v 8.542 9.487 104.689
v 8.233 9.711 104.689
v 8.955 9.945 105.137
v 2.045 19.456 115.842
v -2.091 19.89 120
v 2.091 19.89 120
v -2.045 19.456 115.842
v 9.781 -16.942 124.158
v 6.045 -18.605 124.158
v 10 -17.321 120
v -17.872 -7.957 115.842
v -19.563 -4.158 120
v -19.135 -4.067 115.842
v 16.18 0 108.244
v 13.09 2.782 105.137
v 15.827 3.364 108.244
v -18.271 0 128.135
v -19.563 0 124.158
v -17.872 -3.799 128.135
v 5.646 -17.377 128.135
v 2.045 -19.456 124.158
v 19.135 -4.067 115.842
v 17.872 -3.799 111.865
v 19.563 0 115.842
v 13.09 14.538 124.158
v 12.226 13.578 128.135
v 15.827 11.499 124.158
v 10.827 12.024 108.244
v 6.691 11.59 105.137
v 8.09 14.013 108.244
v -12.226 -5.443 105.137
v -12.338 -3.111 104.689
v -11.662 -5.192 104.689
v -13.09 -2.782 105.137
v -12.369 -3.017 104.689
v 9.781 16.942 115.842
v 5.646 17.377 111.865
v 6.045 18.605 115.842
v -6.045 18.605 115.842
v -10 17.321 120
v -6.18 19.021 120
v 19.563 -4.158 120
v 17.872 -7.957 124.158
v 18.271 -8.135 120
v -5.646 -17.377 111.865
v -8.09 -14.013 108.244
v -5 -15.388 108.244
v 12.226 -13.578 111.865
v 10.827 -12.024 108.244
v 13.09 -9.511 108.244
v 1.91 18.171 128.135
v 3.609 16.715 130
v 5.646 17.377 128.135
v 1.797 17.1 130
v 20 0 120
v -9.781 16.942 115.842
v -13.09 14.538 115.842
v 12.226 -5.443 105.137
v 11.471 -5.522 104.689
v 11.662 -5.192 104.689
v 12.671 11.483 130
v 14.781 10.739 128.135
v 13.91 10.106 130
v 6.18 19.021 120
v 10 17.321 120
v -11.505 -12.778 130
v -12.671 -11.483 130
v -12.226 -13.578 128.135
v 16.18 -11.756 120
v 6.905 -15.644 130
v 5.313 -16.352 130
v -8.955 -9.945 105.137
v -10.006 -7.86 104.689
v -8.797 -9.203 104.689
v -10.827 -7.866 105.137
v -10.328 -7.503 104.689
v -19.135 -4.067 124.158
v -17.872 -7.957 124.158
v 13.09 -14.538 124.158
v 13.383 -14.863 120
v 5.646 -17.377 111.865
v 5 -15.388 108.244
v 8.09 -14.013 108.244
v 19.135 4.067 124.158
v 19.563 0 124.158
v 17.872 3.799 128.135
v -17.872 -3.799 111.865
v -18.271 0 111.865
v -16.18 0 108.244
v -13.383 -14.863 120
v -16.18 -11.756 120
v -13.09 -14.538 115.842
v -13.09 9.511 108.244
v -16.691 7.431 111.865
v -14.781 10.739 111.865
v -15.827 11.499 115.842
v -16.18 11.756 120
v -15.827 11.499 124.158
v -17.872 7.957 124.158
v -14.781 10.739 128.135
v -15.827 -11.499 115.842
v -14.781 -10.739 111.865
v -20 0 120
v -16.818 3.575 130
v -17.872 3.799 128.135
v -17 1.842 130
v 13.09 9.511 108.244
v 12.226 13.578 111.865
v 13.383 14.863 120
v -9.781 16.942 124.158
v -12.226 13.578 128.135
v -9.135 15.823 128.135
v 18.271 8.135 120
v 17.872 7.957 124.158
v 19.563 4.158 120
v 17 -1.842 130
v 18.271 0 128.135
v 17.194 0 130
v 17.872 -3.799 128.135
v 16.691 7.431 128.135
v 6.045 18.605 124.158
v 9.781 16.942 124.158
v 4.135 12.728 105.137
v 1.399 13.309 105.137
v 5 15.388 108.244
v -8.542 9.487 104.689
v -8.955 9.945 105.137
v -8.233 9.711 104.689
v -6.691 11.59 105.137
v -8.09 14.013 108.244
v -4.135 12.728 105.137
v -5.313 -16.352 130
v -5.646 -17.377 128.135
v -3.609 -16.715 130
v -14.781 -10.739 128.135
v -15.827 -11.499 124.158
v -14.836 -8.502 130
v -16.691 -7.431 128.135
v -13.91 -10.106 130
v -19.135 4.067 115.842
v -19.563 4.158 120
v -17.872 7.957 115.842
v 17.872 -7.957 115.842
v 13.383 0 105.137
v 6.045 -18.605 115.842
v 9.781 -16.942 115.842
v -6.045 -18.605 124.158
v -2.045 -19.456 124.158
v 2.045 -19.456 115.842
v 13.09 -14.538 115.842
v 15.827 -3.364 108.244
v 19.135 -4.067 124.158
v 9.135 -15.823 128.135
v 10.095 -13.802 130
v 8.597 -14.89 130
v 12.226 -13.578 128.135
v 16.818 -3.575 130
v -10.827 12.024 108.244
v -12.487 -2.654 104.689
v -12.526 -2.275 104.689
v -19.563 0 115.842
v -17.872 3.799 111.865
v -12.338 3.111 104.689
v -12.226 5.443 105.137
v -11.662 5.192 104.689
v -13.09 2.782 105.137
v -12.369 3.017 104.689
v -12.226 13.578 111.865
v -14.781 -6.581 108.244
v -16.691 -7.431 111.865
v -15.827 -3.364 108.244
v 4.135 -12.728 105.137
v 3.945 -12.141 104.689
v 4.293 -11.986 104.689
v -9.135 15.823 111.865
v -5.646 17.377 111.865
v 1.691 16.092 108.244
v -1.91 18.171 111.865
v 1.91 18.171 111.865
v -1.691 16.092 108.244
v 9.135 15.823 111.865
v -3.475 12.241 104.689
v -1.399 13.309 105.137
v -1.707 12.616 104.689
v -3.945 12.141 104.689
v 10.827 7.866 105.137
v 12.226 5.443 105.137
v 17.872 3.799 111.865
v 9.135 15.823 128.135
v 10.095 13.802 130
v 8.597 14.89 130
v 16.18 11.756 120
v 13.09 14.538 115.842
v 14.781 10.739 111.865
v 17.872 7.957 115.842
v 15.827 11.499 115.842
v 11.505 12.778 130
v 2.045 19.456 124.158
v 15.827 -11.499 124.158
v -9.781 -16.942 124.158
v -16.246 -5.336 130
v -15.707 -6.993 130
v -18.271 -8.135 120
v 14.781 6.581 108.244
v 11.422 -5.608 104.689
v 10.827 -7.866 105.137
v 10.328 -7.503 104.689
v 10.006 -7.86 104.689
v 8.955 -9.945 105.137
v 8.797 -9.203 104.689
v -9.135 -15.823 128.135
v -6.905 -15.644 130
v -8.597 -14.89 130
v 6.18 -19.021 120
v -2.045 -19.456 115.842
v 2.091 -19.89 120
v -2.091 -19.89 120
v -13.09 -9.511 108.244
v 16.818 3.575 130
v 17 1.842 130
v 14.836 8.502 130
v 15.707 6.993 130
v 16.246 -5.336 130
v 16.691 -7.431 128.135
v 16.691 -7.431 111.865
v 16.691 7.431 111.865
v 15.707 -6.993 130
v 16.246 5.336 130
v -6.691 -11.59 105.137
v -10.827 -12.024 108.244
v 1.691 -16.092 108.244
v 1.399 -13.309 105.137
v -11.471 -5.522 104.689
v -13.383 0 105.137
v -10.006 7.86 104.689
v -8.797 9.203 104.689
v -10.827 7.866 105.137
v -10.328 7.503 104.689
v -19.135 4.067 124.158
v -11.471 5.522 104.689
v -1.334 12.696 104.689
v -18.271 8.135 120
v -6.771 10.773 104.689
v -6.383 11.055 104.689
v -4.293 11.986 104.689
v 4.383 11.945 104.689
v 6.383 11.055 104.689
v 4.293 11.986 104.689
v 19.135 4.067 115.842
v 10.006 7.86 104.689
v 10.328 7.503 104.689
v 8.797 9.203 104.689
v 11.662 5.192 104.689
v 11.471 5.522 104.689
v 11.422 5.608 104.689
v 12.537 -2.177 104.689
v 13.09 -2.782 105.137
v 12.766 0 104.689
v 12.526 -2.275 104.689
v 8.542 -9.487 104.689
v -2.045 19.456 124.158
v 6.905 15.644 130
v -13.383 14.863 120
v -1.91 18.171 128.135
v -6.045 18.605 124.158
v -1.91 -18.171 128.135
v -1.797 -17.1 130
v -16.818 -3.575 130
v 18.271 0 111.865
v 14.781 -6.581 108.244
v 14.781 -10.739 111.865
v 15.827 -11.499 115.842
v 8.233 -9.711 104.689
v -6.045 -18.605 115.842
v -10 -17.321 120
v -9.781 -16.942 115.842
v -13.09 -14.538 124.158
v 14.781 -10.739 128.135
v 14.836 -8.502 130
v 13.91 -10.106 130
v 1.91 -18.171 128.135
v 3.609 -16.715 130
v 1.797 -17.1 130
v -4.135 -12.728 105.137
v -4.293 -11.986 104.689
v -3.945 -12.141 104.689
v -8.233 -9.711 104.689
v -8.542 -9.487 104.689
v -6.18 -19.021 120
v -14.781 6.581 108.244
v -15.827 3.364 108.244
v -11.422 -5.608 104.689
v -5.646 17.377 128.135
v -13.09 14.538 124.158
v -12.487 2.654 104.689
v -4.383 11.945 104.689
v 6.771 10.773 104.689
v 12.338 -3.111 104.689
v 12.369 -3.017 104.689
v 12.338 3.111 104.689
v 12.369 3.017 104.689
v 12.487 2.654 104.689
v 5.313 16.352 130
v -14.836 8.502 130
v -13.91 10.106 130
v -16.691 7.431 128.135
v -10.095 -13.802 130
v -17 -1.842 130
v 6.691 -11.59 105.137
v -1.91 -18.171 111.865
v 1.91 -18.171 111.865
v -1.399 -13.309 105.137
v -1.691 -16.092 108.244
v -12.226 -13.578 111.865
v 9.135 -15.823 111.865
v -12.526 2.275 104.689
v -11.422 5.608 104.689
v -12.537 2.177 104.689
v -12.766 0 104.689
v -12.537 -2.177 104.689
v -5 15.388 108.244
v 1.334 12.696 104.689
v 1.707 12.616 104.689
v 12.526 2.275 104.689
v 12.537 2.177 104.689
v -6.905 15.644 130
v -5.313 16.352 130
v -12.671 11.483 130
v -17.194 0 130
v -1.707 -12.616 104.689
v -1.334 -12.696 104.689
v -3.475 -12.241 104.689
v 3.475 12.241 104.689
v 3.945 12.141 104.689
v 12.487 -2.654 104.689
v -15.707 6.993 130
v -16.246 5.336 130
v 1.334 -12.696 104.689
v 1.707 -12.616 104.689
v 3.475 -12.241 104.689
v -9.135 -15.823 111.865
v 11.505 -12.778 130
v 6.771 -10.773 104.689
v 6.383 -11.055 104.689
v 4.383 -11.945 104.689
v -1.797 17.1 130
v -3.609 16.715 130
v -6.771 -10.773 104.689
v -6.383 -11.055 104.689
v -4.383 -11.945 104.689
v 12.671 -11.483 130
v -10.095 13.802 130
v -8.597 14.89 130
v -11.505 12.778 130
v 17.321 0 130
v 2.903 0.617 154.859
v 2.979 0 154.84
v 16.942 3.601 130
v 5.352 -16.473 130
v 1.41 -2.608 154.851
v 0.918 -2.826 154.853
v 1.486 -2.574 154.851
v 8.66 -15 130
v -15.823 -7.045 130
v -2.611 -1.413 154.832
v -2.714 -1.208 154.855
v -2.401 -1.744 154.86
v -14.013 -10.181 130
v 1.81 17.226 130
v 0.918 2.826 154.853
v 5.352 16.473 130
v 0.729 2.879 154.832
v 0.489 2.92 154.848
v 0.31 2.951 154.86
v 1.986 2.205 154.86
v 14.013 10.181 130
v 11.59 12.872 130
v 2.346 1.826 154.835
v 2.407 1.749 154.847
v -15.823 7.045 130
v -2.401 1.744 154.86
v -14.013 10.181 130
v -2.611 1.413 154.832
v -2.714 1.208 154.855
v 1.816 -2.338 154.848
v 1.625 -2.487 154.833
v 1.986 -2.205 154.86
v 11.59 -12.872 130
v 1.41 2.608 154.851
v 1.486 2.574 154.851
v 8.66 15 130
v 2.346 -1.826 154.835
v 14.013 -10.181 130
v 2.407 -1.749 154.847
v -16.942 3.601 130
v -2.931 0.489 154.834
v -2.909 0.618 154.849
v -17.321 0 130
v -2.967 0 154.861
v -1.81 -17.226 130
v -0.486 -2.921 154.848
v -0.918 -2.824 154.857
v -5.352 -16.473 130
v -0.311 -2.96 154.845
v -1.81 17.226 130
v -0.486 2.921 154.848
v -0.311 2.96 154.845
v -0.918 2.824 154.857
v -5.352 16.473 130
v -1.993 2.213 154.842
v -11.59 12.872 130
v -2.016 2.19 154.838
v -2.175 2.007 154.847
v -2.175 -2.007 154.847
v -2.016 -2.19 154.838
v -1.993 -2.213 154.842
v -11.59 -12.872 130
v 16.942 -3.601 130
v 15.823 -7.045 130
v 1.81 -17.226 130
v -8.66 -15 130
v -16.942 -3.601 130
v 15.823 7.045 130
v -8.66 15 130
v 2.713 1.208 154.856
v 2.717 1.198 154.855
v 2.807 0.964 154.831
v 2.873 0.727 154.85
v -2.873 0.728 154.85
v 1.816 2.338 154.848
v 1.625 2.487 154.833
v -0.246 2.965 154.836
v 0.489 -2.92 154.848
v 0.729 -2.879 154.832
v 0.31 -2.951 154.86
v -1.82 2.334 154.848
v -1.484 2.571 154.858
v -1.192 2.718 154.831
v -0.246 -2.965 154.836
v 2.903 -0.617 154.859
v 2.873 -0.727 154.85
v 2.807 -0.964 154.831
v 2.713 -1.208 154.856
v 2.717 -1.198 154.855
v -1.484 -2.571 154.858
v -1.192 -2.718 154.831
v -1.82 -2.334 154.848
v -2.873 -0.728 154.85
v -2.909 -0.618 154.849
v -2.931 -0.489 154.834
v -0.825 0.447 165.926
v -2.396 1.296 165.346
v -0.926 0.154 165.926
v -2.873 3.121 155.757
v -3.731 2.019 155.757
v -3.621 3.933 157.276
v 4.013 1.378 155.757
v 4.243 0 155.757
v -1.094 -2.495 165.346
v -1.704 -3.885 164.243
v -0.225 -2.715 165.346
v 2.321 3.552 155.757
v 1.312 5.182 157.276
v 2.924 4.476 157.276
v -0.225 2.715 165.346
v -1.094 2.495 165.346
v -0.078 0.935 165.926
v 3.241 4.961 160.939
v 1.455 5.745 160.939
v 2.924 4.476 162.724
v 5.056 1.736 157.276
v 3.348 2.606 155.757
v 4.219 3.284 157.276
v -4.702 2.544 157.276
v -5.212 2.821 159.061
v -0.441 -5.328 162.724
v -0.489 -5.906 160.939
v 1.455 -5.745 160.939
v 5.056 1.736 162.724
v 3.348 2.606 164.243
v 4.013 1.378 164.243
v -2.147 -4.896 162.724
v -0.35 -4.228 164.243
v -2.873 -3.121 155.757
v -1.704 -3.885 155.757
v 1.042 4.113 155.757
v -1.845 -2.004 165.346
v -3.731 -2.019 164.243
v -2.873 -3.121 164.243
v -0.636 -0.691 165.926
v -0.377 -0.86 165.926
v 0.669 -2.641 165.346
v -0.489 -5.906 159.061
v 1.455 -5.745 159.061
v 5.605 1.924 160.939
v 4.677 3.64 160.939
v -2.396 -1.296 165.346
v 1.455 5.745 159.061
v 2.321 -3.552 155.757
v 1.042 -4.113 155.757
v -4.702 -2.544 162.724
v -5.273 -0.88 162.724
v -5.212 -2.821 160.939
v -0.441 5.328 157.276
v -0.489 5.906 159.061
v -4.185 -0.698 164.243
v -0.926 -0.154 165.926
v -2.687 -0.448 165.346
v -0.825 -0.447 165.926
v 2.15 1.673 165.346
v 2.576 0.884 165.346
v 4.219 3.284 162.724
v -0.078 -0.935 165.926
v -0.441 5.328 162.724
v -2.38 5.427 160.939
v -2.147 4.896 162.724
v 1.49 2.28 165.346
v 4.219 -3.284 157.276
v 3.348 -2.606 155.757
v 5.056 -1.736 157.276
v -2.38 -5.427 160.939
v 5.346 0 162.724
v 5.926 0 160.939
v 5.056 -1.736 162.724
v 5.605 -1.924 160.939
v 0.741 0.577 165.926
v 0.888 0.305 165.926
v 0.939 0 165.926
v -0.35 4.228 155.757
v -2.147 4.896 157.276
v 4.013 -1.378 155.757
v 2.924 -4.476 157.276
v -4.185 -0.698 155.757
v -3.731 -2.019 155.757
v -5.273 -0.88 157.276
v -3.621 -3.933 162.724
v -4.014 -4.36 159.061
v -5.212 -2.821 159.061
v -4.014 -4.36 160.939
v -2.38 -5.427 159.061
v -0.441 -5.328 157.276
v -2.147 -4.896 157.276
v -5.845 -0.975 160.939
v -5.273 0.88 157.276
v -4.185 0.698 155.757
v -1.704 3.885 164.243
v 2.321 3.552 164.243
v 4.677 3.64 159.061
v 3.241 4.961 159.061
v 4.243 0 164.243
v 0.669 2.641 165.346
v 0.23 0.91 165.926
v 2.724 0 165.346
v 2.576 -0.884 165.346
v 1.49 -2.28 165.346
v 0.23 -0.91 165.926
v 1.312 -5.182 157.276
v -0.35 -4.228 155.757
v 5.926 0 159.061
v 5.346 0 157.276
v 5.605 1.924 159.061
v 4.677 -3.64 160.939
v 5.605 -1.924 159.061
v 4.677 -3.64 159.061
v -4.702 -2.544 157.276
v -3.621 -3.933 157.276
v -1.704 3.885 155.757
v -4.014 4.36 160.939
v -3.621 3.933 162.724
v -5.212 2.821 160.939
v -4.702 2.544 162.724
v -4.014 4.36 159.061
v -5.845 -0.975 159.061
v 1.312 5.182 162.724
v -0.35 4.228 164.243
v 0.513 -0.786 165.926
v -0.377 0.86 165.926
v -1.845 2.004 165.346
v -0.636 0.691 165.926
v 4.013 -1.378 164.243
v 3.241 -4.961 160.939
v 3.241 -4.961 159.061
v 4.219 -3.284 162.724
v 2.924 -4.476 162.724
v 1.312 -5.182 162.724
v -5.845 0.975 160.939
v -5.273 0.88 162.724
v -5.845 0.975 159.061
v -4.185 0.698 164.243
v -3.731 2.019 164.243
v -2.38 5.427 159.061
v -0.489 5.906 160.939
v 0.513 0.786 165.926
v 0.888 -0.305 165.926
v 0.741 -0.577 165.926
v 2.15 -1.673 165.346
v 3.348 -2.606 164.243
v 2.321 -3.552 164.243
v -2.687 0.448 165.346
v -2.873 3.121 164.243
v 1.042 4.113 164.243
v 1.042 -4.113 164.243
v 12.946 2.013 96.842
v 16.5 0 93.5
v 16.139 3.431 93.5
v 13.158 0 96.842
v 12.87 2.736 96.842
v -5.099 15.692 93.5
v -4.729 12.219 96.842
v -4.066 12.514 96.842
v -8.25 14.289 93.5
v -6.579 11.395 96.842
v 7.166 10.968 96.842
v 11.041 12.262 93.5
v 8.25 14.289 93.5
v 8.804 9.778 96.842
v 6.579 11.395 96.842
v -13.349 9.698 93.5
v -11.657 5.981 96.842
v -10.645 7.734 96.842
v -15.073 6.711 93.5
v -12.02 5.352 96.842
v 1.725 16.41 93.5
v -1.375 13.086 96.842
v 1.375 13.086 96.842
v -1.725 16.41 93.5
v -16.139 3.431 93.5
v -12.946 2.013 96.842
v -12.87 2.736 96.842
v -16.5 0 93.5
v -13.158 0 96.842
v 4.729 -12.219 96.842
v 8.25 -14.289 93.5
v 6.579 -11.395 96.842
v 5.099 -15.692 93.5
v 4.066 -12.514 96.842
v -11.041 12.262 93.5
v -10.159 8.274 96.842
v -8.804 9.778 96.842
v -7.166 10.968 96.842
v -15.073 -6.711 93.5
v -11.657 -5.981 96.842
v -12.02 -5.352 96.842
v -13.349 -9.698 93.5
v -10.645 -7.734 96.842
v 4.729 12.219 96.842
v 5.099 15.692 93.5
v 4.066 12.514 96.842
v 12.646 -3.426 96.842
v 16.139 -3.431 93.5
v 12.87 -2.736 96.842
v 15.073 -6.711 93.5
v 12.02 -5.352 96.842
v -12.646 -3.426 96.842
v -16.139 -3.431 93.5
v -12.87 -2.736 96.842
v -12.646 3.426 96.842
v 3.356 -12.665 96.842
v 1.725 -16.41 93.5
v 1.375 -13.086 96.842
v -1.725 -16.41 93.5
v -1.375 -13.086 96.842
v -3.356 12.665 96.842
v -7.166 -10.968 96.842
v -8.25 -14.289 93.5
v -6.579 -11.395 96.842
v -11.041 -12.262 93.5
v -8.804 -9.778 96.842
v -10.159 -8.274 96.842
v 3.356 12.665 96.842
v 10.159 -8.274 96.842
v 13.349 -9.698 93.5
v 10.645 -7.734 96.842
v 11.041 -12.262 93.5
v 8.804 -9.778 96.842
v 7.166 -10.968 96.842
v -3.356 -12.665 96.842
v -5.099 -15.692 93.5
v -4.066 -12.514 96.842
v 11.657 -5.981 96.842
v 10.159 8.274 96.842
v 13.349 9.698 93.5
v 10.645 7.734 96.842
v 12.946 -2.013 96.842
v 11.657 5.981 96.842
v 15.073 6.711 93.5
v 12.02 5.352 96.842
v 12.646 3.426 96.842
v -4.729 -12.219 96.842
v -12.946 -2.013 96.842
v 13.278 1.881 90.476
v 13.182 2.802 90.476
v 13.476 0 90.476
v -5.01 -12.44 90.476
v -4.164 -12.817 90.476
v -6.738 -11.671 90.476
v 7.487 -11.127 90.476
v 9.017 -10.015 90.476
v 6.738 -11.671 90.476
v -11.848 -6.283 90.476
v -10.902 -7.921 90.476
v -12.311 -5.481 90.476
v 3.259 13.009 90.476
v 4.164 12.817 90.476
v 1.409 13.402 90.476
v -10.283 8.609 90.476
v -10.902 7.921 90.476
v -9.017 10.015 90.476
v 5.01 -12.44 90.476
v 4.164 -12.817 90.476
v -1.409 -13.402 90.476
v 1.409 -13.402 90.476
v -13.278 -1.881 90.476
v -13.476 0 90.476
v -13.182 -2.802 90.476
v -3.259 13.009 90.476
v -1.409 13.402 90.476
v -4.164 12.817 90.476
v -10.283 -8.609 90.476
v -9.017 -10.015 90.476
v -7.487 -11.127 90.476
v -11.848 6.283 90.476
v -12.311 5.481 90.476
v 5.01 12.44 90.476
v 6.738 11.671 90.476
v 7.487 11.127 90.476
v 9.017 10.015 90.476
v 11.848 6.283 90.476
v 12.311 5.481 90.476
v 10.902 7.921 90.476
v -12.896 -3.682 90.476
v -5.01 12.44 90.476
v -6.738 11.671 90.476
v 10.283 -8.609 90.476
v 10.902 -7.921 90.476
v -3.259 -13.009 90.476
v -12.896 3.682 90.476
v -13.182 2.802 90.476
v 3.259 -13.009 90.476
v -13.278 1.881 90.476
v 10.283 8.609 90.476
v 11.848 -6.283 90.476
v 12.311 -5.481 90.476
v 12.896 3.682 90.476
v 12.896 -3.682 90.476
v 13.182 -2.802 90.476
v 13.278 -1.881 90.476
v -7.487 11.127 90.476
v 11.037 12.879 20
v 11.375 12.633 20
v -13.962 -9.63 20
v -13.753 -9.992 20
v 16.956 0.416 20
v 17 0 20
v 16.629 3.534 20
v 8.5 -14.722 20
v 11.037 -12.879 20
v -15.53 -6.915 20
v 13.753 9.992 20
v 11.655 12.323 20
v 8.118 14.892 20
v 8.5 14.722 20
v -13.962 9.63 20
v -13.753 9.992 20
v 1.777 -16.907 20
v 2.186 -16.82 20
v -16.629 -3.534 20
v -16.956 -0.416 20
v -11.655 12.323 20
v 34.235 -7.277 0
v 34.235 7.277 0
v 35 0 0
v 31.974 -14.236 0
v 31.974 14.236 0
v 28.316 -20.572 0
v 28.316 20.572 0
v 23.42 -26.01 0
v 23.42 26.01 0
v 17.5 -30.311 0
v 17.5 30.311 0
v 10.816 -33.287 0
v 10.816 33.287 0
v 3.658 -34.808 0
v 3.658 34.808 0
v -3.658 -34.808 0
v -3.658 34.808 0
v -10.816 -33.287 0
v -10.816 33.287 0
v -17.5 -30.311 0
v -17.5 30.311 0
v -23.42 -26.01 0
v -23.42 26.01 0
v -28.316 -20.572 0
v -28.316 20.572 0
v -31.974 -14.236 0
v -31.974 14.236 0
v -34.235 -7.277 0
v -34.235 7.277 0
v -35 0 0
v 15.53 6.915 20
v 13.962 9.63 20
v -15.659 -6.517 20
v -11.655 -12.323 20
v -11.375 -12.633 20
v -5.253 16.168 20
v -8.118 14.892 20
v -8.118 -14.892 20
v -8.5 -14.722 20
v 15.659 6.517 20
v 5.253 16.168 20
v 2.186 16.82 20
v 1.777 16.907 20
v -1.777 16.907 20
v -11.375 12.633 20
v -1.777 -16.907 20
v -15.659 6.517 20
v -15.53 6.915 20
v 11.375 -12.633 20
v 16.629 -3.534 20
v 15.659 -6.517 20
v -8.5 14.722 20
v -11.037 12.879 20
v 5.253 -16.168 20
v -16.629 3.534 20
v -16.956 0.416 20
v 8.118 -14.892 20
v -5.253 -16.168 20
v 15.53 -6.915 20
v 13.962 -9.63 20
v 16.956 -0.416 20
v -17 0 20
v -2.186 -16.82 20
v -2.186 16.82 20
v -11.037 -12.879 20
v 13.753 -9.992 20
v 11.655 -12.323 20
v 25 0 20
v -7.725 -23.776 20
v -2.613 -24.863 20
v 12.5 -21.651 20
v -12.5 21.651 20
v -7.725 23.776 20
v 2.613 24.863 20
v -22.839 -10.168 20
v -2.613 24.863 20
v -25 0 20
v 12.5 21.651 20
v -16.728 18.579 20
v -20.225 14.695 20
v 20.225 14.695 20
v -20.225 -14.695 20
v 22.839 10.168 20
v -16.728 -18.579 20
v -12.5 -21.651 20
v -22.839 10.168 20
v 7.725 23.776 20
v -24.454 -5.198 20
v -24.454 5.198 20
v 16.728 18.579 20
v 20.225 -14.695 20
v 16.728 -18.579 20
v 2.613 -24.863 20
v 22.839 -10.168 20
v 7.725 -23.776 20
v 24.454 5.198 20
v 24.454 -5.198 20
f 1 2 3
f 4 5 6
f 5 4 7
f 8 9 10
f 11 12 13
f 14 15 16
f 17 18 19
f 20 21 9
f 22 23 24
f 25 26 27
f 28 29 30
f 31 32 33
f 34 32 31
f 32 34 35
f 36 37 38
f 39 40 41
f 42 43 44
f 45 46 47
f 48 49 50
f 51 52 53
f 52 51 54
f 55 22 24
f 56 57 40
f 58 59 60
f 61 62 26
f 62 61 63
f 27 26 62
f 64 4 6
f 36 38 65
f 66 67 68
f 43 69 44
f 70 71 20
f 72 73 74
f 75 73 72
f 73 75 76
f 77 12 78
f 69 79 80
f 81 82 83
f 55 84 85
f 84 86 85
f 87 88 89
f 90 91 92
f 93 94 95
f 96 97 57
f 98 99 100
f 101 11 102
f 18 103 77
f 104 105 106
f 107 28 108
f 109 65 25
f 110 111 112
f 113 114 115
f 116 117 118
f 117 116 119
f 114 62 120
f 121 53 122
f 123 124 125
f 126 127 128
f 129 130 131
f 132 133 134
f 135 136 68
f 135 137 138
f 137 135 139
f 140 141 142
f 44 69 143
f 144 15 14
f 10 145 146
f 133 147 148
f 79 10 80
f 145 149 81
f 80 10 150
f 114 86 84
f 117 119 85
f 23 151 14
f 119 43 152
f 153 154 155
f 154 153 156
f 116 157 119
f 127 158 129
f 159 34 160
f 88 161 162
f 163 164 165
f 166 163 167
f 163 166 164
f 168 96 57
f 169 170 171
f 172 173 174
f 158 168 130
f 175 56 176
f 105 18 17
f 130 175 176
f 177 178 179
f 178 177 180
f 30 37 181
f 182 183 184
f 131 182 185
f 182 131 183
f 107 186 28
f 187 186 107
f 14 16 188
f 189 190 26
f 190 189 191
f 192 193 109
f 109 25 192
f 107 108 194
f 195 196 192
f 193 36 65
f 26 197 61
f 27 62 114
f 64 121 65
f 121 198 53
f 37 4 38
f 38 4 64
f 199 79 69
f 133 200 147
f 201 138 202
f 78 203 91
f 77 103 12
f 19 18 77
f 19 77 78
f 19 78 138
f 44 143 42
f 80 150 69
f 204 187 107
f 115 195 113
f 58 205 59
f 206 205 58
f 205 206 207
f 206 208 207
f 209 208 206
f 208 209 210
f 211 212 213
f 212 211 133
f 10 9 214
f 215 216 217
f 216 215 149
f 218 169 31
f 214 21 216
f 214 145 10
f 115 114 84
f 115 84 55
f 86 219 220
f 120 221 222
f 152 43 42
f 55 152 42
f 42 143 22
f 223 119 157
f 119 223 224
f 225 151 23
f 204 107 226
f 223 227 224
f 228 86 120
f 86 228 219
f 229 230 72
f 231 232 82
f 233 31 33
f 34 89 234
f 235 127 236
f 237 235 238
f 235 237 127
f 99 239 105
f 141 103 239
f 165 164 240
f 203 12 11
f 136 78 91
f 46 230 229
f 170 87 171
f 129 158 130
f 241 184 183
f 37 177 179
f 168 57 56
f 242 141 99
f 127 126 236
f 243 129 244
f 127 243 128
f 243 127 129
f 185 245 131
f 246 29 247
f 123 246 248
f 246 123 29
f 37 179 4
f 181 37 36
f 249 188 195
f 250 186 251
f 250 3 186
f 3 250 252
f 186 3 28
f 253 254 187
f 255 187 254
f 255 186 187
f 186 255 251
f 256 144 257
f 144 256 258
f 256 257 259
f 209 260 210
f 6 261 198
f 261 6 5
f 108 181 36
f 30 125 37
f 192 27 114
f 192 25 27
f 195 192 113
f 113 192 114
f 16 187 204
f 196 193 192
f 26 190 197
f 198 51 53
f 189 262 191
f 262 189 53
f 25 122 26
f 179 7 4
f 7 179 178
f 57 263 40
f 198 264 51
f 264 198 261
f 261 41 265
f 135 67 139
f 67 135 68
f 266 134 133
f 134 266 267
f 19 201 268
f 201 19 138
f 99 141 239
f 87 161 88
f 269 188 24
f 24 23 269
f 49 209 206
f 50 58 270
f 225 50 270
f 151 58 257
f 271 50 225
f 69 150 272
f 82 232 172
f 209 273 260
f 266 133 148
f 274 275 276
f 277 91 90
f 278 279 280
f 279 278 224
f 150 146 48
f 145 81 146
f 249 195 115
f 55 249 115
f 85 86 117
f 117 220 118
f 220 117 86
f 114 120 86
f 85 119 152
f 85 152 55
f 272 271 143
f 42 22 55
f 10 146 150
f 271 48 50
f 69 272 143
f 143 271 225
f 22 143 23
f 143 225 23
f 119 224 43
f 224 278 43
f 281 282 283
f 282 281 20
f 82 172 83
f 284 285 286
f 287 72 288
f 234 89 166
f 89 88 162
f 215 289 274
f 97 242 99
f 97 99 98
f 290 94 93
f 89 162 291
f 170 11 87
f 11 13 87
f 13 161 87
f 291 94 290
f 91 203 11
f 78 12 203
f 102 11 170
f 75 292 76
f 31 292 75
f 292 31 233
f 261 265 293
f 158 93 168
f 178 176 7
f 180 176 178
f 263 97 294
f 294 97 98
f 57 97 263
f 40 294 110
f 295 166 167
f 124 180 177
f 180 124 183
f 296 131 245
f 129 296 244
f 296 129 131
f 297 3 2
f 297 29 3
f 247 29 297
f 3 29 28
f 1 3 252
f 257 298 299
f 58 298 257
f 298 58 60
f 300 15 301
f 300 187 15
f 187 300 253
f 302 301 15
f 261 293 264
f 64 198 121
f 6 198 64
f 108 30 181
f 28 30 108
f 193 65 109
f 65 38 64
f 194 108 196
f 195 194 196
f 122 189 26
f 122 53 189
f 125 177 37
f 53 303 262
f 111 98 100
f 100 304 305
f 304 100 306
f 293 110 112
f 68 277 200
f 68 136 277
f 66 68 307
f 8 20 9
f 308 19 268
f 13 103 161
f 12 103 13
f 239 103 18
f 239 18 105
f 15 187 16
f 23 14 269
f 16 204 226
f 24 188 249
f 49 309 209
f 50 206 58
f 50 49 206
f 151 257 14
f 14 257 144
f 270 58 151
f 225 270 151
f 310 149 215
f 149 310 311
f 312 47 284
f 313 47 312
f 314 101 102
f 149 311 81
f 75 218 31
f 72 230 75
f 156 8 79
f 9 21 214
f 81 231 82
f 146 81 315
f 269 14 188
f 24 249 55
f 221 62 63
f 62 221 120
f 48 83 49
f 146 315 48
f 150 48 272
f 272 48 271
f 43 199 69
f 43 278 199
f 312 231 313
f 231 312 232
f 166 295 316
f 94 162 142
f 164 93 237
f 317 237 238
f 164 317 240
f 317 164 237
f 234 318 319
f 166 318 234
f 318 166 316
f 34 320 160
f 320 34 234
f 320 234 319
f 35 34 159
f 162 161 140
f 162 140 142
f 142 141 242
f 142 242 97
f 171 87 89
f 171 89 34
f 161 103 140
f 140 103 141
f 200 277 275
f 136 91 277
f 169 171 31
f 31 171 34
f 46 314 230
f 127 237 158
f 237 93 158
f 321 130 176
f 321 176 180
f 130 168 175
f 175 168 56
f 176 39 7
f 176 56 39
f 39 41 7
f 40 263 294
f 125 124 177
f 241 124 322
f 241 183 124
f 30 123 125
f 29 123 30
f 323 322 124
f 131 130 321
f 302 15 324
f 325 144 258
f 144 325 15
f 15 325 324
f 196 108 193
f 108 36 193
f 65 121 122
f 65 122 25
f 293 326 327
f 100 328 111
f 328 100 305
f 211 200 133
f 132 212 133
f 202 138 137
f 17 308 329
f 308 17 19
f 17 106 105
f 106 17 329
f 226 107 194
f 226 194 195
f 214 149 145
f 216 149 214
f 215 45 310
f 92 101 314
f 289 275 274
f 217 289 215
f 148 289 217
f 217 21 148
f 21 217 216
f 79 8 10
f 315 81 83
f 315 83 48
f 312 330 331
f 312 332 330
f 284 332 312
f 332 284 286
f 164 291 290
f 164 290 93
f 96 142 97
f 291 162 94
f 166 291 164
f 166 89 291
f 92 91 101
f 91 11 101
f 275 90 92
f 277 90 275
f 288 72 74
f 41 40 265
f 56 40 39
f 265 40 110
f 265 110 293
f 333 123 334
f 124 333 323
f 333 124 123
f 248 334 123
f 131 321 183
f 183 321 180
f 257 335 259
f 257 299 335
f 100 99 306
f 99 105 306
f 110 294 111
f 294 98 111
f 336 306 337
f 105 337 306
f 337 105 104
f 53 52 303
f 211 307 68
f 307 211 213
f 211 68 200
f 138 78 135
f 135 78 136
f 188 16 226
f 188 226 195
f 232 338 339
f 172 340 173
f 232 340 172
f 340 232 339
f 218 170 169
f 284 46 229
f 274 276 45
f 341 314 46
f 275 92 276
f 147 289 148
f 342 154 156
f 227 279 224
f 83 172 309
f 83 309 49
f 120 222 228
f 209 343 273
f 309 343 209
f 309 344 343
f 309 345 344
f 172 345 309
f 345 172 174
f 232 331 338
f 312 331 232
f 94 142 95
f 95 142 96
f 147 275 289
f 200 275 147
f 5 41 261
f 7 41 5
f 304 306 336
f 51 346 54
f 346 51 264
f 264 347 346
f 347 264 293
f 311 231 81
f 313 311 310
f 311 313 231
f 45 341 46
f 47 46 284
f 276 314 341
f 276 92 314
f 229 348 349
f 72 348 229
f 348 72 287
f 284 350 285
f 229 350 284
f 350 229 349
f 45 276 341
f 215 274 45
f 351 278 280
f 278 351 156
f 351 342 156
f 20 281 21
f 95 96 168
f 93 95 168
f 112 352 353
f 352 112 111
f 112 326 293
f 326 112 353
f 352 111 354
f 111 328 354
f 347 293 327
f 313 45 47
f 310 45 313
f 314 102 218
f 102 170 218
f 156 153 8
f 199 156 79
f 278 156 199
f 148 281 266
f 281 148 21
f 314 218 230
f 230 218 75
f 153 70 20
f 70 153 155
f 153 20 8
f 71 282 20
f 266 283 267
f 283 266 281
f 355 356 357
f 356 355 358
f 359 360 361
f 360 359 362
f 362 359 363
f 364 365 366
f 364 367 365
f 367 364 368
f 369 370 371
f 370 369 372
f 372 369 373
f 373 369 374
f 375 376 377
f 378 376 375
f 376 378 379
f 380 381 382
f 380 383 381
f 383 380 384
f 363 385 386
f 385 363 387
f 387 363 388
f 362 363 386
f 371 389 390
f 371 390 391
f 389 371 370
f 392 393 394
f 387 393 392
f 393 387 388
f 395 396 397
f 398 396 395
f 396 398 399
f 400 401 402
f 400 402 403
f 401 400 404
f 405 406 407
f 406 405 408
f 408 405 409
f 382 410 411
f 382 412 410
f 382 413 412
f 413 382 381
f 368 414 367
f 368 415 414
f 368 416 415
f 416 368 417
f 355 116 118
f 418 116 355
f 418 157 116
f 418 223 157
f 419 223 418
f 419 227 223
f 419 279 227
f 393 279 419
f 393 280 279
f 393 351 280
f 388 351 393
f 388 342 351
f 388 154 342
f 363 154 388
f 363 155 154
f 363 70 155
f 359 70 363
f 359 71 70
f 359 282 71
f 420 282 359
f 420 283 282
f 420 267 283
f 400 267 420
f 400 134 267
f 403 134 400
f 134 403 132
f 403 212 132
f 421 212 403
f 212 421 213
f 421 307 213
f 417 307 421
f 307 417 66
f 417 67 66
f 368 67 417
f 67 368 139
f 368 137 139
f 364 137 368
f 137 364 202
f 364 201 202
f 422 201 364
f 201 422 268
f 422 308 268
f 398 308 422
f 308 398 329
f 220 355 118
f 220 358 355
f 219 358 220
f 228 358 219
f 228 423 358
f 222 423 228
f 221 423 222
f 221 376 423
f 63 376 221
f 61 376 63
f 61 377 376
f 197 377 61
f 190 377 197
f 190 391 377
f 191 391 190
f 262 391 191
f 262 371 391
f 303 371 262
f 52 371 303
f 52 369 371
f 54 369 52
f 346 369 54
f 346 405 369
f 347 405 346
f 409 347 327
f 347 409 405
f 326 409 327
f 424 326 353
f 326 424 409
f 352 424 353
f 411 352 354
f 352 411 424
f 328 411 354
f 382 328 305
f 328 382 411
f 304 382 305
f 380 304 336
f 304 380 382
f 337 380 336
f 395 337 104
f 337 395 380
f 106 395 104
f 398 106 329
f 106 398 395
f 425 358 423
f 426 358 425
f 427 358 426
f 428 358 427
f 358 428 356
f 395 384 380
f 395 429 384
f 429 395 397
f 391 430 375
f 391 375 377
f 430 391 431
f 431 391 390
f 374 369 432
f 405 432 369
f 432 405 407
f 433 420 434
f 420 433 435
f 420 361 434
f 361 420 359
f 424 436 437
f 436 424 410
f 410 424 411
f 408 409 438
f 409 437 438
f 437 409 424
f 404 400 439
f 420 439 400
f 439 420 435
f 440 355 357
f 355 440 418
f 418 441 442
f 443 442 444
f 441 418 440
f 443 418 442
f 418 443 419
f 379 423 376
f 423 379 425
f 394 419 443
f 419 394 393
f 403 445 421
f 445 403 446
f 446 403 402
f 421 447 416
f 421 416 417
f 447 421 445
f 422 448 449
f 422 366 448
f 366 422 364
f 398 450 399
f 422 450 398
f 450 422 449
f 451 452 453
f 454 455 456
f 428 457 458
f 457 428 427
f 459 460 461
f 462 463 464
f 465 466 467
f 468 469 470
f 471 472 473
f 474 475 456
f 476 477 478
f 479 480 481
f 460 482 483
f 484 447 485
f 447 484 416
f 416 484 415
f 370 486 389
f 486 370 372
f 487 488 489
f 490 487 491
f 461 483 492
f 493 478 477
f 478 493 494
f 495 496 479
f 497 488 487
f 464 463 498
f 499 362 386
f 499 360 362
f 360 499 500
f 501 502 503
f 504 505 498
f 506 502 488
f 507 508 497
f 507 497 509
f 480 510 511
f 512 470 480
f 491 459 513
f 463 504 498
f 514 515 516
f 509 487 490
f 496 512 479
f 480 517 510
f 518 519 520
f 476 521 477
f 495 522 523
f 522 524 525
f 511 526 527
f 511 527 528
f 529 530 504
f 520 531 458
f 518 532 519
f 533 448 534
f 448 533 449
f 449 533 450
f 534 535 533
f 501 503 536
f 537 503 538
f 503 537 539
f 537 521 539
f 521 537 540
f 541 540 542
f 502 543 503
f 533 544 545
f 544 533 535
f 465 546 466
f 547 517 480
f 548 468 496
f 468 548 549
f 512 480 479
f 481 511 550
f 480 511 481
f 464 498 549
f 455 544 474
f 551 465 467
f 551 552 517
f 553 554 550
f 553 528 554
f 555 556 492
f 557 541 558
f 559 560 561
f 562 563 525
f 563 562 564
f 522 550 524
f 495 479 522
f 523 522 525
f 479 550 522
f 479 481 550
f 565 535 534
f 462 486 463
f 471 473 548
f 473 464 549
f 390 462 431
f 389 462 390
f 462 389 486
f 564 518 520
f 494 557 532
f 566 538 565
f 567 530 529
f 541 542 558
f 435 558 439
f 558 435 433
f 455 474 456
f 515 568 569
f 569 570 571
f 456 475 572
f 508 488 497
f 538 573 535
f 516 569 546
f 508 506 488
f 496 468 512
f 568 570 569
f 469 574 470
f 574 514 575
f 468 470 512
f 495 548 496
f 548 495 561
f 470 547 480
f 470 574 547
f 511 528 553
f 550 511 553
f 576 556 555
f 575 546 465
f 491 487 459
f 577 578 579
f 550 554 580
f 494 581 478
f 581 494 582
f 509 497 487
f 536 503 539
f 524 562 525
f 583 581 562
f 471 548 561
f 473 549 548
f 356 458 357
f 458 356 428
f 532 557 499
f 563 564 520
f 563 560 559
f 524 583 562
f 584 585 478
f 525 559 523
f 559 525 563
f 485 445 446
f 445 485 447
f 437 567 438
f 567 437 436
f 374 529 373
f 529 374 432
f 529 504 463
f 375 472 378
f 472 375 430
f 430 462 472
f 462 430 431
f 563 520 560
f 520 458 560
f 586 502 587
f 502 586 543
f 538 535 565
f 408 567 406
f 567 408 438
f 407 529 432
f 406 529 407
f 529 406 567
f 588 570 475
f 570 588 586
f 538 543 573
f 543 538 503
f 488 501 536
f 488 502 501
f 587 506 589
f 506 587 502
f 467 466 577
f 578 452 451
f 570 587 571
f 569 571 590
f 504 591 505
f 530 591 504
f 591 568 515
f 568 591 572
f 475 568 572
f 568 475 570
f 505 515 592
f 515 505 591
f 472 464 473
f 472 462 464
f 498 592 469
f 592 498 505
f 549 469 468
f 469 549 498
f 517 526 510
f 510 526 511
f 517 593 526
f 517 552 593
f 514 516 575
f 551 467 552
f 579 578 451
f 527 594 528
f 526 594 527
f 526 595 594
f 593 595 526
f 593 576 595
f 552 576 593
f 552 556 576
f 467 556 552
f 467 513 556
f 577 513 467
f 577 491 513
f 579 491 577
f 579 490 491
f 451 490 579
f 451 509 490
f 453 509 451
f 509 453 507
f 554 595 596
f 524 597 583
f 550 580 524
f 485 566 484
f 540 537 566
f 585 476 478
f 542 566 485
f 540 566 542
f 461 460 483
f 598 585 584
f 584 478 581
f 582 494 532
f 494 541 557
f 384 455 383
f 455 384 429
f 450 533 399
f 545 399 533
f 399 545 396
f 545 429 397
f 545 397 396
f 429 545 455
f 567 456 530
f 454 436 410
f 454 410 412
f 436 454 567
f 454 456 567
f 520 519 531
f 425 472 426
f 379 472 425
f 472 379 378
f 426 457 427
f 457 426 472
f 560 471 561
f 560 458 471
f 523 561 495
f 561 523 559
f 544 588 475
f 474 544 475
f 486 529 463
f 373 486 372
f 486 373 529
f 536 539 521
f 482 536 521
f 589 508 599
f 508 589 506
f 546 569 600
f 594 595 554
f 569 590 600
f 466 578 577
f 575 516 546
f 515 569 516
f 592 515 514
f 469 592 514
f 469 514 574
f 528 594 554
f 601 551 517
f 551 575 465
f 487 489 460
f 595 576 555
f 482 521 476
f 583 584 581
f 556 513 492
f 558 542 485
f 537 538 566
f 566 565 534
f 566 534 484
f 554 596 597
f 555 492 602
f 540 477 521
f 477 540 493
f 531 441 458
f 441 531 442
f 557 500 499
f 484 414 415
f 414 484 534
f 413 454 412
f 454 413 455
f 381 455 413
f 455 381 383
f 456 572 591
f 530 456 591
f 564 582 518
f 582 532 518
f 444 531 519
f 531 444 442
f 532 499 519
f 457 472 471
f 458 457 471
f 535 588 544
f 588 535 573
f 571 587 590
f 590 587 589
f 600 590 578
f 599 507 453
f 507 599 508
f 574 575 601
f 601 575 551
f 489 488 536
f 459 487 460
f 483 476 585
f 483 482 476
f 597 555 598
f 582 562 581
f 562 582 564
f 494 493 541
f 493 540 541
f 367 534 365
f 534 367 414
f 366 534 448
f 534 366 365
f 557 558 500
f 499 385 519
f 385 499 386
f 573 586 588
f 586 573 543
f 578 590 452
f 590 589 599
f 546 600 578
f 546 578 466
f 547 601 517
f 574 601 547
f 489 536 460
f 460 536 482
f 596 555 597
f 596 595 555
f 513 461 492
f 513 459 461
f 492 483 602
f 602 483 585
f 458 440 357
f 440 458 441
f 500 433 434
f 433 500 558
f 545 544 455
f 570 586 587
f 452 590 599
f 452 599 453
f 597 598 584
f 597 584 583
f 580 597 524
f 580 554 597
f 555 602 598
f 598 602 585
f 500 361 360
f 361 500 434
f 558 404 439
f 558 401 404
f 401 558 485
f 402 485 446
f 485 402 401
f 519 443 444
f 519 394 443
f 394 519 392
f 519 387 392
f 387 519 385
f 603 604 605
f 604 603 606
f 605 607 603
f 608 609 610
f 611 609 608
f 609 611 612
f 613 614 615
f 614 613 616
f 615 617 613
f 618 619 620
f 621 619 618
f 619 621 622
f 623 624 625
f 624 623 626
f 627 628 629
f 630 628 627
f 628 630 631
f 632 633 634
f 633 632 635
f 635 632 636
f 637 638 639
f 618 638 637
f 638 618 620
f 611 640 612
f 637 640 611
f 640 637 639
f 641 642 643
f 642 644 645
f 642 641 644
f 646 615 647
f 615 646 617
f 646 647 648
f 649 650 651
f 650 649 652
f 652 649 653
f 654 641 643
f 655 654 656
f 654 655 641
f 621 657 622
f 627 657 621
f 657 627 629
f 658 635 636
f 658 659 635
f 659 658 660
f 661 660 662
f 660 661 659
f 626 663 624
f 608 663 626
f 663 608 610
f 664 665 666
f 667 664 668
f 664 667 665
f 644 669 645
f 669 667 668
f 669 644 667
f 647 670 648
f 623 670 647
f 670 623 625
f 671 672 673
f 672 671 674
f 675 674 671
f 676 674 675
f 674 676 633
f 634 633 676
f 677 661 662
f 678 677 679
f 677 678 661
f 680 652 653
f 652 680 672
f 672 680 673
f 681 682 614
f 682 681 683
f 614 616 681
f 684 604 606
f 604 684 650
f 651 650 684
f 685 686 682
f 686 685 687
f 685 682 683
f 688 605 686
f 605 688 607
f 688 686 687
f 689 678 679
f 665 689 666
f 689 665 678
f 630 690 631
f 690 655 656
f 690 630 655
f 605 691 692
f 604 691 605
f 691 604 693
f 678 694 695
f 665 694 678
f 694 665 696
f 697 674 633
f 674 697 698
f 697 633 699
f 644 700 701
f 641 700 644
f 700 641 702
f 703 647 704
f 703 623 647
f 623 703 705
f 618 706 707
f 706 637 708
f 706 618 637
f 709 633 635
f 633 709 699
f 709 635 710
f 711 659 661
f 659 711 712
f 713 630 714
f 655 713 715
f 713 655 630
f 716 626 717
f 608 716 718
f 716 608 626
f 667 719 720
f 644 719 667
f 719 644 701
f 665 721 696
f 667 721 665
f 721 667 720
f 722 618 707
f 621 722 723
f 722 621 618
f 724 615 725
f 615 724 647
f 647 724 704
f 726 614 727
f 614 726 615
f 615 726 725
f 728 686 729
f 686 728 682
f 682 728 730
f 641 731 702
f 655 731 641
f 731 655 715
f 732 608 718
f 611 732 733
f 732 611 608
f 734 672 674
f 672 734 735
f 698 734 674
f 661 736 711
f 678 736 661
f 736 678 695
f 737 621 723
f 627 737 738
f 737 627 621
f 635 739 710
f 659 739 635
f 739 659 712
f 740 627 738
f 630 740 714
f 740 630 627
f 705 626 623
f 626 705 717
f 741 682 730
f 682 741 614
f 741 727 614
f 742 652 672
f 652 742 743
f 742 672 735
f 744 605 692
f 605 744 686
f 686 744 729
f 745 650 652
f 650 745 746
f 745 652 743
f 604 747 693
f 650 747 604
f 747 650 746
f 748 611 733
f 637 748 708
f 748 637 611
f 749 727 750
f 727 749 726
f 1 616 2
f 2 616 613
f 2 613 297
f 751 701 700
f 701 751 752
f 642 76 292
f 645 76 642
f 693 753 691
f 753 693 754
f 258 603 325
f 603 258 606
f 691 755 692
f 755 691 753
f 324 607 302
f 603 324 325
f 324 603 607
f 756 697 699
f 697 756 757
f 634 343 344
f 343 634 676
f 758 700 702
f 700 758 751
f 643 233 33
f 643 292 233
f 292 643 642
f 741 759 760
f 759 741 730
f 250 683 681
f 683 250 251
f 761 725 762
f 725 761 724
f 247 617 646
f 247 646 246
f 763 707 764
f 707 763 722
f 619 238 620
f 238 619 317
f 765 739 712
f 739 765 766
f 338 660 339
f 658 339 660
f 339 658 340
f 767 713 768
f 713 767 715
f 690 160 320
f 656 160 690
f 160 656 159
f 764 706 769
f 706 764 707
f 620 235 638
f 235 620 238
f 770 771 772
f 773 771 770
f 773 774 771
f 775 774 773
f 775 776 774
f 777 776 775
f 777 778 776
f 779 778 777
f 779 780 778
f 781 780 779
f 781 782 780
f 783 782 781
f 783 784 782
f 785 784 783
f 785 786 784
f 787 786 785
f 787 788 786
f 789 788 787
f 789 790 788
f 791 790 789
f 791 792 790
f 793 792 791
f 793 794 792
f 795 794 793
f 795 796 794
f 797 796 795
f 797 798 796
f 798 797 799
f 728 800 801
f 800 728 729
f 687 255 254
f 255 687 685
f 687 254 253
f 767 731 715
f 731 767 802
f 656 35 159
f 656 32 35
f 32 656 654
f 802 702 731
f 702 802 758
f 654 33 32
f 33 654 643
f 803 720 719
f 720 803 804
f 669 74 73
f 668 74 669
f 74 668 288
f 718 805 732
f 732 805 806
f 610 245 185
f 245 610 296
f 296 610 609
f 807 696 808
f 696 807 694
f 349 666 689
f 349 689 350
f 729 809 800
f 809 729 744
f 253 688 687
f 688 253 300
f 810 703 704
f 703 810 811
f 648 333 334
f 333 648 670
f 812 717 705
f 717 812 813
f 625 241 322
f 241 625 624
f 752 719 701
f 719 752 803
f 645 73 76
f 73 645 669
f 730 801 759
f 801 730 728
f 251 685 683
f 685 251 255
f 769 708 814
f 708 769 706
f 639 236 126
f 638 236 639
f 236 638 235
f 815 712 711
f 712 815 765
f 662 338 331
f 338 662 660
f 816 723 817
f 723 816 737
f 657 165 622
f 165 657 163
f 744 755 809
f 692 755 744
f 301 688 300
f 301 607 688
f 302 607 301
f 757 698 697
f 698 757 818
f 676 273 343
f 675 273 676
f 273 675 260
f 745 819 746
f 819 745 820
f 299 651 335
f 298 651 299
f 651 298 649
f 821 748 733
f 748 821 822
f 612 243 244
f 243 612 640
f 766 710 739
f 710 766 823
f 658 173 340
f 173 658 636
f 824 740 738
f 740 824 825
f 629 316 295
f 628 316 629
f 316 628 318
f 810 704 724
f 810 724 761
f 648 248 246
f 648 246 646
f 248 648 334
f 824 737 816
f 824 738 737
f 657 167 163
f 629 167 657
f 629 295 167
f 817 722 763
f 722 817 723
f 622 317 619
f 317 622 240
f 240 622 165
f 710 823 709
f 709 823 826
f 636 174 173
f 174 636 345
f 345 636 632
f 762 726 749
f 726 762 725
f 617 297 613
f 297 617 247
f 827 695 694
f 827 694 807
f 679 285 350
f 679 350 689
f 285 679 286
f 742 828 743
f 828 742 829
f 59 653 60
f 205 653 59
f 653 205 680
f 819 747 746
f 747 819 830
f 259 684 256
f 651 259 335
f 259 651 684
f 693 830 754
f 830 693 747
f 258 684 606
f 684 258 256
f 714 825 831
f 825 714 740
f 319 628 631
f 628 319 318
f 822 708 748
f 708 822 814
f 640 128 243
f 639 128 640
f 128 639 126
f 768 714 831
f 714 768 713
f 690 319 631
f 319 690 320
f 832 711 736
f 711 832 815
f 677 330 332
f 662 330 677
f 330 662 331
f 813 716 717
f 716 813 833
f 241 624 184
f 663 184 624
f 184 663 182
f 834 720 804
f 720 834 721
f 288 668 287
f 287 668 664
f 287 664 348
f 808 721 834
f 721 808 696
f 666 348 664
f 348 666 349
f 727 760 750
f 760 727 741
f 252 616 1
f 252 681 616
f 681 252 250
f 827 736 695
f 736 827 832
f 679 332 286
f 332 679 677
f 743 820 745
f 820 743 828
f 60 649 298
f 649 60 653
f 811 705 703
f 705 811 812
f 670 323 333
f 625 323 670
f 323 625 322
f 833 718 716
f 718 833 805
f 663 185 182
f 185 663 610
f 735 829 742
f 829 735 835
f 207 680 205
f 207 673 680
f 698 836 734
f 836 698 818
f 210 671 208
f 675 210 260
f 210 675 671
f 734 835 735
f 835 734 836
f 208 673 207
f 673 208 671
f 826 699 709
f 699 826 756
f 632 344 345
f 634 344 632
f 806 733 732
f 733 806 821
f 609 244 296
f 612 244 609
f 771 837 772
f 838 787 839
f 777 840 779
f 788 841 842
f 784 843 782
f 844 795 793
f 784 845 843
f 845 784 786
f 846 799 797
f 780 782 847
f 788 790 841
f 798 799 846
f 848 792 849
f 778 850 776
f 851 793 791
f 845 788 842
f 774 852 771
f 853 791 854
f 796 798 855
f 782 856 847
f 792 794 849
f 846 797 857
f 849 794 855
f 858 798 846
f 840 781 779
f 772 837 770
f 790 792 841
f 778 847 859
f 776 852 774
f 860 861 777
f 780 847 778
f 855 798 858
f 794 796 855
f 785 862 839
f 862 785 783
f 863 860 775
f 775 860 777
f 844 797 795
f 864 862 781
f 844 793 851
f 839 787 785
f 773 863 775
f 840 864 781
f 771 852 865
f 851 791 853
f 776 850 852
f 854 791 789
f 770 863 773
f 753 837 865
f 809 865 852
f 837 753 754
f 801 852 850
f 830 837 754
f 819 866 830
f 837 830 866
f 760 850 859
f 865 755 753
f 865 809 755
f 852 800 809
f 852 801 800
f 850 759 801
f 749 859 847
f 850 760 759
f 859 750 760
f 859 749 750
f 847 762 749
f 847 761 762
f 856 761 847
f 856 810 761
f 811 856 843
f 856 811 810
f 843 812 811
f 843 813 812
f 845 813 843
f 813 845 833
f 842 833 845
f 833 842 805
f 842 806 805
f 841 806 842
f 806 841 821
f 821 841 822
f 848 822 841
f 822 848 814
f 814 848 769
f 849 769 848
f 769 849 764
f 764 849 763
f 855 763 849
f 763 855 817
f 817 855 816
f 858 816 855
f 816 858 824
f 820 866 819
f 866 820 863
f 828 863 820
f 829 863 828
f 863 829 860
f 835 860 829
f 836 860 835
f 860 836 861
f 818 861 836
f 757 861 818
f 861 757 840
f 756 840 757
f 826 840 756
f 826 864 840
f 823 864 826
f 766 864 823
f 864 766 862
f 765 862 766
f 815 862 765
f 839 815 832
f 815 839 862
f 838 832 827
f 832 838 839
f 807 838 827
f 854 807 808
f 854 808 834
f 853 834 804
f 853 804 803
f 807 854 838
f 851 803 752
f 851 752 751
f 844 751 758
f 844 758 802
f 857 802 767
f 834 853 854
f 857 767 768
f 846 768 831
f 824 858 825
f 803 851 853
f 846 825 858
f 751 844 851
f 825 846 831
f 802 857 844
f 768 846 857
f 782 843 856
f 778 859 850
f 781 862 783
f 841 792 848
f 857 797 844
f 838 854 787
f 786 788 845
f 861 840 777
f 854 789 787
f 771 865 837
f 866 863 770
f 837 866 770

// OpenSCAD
union() {
  // head
  translate([0, 0, 120])
    difference() {
      union() {
        // teardrop shape
        sphere(r = 20);
        translate([0, 0, 20 * sin(30)])
          cylinder(h = 30, r1 = 20 * cos(30), r2 = 0);

        // dollop
        translate([0, 0, 30 + 20 * sin(30)])
          sphere(r = 6);
      }
      //cut out slot
     // rotate([45, 0, 0])
       // translate([-20, 0, 0])
         // cube([40, 5, 40]);
    }
  // neck
  cylinder(h = 120, r1 = 18, r2 = 12);

  // base
  cylinder(h = 20, r1 = 35, r2 = 25);

  // collar
  translate([0, 0, 90])
    intersection() {
      cylinder(h = 20, r1 = 20, r2 = 0);
      translate([0, 0, 7])
        mirror([0, 0, 1])
          cylinder(h = 20, r1 = 20, r2 = 0);
    }
}
